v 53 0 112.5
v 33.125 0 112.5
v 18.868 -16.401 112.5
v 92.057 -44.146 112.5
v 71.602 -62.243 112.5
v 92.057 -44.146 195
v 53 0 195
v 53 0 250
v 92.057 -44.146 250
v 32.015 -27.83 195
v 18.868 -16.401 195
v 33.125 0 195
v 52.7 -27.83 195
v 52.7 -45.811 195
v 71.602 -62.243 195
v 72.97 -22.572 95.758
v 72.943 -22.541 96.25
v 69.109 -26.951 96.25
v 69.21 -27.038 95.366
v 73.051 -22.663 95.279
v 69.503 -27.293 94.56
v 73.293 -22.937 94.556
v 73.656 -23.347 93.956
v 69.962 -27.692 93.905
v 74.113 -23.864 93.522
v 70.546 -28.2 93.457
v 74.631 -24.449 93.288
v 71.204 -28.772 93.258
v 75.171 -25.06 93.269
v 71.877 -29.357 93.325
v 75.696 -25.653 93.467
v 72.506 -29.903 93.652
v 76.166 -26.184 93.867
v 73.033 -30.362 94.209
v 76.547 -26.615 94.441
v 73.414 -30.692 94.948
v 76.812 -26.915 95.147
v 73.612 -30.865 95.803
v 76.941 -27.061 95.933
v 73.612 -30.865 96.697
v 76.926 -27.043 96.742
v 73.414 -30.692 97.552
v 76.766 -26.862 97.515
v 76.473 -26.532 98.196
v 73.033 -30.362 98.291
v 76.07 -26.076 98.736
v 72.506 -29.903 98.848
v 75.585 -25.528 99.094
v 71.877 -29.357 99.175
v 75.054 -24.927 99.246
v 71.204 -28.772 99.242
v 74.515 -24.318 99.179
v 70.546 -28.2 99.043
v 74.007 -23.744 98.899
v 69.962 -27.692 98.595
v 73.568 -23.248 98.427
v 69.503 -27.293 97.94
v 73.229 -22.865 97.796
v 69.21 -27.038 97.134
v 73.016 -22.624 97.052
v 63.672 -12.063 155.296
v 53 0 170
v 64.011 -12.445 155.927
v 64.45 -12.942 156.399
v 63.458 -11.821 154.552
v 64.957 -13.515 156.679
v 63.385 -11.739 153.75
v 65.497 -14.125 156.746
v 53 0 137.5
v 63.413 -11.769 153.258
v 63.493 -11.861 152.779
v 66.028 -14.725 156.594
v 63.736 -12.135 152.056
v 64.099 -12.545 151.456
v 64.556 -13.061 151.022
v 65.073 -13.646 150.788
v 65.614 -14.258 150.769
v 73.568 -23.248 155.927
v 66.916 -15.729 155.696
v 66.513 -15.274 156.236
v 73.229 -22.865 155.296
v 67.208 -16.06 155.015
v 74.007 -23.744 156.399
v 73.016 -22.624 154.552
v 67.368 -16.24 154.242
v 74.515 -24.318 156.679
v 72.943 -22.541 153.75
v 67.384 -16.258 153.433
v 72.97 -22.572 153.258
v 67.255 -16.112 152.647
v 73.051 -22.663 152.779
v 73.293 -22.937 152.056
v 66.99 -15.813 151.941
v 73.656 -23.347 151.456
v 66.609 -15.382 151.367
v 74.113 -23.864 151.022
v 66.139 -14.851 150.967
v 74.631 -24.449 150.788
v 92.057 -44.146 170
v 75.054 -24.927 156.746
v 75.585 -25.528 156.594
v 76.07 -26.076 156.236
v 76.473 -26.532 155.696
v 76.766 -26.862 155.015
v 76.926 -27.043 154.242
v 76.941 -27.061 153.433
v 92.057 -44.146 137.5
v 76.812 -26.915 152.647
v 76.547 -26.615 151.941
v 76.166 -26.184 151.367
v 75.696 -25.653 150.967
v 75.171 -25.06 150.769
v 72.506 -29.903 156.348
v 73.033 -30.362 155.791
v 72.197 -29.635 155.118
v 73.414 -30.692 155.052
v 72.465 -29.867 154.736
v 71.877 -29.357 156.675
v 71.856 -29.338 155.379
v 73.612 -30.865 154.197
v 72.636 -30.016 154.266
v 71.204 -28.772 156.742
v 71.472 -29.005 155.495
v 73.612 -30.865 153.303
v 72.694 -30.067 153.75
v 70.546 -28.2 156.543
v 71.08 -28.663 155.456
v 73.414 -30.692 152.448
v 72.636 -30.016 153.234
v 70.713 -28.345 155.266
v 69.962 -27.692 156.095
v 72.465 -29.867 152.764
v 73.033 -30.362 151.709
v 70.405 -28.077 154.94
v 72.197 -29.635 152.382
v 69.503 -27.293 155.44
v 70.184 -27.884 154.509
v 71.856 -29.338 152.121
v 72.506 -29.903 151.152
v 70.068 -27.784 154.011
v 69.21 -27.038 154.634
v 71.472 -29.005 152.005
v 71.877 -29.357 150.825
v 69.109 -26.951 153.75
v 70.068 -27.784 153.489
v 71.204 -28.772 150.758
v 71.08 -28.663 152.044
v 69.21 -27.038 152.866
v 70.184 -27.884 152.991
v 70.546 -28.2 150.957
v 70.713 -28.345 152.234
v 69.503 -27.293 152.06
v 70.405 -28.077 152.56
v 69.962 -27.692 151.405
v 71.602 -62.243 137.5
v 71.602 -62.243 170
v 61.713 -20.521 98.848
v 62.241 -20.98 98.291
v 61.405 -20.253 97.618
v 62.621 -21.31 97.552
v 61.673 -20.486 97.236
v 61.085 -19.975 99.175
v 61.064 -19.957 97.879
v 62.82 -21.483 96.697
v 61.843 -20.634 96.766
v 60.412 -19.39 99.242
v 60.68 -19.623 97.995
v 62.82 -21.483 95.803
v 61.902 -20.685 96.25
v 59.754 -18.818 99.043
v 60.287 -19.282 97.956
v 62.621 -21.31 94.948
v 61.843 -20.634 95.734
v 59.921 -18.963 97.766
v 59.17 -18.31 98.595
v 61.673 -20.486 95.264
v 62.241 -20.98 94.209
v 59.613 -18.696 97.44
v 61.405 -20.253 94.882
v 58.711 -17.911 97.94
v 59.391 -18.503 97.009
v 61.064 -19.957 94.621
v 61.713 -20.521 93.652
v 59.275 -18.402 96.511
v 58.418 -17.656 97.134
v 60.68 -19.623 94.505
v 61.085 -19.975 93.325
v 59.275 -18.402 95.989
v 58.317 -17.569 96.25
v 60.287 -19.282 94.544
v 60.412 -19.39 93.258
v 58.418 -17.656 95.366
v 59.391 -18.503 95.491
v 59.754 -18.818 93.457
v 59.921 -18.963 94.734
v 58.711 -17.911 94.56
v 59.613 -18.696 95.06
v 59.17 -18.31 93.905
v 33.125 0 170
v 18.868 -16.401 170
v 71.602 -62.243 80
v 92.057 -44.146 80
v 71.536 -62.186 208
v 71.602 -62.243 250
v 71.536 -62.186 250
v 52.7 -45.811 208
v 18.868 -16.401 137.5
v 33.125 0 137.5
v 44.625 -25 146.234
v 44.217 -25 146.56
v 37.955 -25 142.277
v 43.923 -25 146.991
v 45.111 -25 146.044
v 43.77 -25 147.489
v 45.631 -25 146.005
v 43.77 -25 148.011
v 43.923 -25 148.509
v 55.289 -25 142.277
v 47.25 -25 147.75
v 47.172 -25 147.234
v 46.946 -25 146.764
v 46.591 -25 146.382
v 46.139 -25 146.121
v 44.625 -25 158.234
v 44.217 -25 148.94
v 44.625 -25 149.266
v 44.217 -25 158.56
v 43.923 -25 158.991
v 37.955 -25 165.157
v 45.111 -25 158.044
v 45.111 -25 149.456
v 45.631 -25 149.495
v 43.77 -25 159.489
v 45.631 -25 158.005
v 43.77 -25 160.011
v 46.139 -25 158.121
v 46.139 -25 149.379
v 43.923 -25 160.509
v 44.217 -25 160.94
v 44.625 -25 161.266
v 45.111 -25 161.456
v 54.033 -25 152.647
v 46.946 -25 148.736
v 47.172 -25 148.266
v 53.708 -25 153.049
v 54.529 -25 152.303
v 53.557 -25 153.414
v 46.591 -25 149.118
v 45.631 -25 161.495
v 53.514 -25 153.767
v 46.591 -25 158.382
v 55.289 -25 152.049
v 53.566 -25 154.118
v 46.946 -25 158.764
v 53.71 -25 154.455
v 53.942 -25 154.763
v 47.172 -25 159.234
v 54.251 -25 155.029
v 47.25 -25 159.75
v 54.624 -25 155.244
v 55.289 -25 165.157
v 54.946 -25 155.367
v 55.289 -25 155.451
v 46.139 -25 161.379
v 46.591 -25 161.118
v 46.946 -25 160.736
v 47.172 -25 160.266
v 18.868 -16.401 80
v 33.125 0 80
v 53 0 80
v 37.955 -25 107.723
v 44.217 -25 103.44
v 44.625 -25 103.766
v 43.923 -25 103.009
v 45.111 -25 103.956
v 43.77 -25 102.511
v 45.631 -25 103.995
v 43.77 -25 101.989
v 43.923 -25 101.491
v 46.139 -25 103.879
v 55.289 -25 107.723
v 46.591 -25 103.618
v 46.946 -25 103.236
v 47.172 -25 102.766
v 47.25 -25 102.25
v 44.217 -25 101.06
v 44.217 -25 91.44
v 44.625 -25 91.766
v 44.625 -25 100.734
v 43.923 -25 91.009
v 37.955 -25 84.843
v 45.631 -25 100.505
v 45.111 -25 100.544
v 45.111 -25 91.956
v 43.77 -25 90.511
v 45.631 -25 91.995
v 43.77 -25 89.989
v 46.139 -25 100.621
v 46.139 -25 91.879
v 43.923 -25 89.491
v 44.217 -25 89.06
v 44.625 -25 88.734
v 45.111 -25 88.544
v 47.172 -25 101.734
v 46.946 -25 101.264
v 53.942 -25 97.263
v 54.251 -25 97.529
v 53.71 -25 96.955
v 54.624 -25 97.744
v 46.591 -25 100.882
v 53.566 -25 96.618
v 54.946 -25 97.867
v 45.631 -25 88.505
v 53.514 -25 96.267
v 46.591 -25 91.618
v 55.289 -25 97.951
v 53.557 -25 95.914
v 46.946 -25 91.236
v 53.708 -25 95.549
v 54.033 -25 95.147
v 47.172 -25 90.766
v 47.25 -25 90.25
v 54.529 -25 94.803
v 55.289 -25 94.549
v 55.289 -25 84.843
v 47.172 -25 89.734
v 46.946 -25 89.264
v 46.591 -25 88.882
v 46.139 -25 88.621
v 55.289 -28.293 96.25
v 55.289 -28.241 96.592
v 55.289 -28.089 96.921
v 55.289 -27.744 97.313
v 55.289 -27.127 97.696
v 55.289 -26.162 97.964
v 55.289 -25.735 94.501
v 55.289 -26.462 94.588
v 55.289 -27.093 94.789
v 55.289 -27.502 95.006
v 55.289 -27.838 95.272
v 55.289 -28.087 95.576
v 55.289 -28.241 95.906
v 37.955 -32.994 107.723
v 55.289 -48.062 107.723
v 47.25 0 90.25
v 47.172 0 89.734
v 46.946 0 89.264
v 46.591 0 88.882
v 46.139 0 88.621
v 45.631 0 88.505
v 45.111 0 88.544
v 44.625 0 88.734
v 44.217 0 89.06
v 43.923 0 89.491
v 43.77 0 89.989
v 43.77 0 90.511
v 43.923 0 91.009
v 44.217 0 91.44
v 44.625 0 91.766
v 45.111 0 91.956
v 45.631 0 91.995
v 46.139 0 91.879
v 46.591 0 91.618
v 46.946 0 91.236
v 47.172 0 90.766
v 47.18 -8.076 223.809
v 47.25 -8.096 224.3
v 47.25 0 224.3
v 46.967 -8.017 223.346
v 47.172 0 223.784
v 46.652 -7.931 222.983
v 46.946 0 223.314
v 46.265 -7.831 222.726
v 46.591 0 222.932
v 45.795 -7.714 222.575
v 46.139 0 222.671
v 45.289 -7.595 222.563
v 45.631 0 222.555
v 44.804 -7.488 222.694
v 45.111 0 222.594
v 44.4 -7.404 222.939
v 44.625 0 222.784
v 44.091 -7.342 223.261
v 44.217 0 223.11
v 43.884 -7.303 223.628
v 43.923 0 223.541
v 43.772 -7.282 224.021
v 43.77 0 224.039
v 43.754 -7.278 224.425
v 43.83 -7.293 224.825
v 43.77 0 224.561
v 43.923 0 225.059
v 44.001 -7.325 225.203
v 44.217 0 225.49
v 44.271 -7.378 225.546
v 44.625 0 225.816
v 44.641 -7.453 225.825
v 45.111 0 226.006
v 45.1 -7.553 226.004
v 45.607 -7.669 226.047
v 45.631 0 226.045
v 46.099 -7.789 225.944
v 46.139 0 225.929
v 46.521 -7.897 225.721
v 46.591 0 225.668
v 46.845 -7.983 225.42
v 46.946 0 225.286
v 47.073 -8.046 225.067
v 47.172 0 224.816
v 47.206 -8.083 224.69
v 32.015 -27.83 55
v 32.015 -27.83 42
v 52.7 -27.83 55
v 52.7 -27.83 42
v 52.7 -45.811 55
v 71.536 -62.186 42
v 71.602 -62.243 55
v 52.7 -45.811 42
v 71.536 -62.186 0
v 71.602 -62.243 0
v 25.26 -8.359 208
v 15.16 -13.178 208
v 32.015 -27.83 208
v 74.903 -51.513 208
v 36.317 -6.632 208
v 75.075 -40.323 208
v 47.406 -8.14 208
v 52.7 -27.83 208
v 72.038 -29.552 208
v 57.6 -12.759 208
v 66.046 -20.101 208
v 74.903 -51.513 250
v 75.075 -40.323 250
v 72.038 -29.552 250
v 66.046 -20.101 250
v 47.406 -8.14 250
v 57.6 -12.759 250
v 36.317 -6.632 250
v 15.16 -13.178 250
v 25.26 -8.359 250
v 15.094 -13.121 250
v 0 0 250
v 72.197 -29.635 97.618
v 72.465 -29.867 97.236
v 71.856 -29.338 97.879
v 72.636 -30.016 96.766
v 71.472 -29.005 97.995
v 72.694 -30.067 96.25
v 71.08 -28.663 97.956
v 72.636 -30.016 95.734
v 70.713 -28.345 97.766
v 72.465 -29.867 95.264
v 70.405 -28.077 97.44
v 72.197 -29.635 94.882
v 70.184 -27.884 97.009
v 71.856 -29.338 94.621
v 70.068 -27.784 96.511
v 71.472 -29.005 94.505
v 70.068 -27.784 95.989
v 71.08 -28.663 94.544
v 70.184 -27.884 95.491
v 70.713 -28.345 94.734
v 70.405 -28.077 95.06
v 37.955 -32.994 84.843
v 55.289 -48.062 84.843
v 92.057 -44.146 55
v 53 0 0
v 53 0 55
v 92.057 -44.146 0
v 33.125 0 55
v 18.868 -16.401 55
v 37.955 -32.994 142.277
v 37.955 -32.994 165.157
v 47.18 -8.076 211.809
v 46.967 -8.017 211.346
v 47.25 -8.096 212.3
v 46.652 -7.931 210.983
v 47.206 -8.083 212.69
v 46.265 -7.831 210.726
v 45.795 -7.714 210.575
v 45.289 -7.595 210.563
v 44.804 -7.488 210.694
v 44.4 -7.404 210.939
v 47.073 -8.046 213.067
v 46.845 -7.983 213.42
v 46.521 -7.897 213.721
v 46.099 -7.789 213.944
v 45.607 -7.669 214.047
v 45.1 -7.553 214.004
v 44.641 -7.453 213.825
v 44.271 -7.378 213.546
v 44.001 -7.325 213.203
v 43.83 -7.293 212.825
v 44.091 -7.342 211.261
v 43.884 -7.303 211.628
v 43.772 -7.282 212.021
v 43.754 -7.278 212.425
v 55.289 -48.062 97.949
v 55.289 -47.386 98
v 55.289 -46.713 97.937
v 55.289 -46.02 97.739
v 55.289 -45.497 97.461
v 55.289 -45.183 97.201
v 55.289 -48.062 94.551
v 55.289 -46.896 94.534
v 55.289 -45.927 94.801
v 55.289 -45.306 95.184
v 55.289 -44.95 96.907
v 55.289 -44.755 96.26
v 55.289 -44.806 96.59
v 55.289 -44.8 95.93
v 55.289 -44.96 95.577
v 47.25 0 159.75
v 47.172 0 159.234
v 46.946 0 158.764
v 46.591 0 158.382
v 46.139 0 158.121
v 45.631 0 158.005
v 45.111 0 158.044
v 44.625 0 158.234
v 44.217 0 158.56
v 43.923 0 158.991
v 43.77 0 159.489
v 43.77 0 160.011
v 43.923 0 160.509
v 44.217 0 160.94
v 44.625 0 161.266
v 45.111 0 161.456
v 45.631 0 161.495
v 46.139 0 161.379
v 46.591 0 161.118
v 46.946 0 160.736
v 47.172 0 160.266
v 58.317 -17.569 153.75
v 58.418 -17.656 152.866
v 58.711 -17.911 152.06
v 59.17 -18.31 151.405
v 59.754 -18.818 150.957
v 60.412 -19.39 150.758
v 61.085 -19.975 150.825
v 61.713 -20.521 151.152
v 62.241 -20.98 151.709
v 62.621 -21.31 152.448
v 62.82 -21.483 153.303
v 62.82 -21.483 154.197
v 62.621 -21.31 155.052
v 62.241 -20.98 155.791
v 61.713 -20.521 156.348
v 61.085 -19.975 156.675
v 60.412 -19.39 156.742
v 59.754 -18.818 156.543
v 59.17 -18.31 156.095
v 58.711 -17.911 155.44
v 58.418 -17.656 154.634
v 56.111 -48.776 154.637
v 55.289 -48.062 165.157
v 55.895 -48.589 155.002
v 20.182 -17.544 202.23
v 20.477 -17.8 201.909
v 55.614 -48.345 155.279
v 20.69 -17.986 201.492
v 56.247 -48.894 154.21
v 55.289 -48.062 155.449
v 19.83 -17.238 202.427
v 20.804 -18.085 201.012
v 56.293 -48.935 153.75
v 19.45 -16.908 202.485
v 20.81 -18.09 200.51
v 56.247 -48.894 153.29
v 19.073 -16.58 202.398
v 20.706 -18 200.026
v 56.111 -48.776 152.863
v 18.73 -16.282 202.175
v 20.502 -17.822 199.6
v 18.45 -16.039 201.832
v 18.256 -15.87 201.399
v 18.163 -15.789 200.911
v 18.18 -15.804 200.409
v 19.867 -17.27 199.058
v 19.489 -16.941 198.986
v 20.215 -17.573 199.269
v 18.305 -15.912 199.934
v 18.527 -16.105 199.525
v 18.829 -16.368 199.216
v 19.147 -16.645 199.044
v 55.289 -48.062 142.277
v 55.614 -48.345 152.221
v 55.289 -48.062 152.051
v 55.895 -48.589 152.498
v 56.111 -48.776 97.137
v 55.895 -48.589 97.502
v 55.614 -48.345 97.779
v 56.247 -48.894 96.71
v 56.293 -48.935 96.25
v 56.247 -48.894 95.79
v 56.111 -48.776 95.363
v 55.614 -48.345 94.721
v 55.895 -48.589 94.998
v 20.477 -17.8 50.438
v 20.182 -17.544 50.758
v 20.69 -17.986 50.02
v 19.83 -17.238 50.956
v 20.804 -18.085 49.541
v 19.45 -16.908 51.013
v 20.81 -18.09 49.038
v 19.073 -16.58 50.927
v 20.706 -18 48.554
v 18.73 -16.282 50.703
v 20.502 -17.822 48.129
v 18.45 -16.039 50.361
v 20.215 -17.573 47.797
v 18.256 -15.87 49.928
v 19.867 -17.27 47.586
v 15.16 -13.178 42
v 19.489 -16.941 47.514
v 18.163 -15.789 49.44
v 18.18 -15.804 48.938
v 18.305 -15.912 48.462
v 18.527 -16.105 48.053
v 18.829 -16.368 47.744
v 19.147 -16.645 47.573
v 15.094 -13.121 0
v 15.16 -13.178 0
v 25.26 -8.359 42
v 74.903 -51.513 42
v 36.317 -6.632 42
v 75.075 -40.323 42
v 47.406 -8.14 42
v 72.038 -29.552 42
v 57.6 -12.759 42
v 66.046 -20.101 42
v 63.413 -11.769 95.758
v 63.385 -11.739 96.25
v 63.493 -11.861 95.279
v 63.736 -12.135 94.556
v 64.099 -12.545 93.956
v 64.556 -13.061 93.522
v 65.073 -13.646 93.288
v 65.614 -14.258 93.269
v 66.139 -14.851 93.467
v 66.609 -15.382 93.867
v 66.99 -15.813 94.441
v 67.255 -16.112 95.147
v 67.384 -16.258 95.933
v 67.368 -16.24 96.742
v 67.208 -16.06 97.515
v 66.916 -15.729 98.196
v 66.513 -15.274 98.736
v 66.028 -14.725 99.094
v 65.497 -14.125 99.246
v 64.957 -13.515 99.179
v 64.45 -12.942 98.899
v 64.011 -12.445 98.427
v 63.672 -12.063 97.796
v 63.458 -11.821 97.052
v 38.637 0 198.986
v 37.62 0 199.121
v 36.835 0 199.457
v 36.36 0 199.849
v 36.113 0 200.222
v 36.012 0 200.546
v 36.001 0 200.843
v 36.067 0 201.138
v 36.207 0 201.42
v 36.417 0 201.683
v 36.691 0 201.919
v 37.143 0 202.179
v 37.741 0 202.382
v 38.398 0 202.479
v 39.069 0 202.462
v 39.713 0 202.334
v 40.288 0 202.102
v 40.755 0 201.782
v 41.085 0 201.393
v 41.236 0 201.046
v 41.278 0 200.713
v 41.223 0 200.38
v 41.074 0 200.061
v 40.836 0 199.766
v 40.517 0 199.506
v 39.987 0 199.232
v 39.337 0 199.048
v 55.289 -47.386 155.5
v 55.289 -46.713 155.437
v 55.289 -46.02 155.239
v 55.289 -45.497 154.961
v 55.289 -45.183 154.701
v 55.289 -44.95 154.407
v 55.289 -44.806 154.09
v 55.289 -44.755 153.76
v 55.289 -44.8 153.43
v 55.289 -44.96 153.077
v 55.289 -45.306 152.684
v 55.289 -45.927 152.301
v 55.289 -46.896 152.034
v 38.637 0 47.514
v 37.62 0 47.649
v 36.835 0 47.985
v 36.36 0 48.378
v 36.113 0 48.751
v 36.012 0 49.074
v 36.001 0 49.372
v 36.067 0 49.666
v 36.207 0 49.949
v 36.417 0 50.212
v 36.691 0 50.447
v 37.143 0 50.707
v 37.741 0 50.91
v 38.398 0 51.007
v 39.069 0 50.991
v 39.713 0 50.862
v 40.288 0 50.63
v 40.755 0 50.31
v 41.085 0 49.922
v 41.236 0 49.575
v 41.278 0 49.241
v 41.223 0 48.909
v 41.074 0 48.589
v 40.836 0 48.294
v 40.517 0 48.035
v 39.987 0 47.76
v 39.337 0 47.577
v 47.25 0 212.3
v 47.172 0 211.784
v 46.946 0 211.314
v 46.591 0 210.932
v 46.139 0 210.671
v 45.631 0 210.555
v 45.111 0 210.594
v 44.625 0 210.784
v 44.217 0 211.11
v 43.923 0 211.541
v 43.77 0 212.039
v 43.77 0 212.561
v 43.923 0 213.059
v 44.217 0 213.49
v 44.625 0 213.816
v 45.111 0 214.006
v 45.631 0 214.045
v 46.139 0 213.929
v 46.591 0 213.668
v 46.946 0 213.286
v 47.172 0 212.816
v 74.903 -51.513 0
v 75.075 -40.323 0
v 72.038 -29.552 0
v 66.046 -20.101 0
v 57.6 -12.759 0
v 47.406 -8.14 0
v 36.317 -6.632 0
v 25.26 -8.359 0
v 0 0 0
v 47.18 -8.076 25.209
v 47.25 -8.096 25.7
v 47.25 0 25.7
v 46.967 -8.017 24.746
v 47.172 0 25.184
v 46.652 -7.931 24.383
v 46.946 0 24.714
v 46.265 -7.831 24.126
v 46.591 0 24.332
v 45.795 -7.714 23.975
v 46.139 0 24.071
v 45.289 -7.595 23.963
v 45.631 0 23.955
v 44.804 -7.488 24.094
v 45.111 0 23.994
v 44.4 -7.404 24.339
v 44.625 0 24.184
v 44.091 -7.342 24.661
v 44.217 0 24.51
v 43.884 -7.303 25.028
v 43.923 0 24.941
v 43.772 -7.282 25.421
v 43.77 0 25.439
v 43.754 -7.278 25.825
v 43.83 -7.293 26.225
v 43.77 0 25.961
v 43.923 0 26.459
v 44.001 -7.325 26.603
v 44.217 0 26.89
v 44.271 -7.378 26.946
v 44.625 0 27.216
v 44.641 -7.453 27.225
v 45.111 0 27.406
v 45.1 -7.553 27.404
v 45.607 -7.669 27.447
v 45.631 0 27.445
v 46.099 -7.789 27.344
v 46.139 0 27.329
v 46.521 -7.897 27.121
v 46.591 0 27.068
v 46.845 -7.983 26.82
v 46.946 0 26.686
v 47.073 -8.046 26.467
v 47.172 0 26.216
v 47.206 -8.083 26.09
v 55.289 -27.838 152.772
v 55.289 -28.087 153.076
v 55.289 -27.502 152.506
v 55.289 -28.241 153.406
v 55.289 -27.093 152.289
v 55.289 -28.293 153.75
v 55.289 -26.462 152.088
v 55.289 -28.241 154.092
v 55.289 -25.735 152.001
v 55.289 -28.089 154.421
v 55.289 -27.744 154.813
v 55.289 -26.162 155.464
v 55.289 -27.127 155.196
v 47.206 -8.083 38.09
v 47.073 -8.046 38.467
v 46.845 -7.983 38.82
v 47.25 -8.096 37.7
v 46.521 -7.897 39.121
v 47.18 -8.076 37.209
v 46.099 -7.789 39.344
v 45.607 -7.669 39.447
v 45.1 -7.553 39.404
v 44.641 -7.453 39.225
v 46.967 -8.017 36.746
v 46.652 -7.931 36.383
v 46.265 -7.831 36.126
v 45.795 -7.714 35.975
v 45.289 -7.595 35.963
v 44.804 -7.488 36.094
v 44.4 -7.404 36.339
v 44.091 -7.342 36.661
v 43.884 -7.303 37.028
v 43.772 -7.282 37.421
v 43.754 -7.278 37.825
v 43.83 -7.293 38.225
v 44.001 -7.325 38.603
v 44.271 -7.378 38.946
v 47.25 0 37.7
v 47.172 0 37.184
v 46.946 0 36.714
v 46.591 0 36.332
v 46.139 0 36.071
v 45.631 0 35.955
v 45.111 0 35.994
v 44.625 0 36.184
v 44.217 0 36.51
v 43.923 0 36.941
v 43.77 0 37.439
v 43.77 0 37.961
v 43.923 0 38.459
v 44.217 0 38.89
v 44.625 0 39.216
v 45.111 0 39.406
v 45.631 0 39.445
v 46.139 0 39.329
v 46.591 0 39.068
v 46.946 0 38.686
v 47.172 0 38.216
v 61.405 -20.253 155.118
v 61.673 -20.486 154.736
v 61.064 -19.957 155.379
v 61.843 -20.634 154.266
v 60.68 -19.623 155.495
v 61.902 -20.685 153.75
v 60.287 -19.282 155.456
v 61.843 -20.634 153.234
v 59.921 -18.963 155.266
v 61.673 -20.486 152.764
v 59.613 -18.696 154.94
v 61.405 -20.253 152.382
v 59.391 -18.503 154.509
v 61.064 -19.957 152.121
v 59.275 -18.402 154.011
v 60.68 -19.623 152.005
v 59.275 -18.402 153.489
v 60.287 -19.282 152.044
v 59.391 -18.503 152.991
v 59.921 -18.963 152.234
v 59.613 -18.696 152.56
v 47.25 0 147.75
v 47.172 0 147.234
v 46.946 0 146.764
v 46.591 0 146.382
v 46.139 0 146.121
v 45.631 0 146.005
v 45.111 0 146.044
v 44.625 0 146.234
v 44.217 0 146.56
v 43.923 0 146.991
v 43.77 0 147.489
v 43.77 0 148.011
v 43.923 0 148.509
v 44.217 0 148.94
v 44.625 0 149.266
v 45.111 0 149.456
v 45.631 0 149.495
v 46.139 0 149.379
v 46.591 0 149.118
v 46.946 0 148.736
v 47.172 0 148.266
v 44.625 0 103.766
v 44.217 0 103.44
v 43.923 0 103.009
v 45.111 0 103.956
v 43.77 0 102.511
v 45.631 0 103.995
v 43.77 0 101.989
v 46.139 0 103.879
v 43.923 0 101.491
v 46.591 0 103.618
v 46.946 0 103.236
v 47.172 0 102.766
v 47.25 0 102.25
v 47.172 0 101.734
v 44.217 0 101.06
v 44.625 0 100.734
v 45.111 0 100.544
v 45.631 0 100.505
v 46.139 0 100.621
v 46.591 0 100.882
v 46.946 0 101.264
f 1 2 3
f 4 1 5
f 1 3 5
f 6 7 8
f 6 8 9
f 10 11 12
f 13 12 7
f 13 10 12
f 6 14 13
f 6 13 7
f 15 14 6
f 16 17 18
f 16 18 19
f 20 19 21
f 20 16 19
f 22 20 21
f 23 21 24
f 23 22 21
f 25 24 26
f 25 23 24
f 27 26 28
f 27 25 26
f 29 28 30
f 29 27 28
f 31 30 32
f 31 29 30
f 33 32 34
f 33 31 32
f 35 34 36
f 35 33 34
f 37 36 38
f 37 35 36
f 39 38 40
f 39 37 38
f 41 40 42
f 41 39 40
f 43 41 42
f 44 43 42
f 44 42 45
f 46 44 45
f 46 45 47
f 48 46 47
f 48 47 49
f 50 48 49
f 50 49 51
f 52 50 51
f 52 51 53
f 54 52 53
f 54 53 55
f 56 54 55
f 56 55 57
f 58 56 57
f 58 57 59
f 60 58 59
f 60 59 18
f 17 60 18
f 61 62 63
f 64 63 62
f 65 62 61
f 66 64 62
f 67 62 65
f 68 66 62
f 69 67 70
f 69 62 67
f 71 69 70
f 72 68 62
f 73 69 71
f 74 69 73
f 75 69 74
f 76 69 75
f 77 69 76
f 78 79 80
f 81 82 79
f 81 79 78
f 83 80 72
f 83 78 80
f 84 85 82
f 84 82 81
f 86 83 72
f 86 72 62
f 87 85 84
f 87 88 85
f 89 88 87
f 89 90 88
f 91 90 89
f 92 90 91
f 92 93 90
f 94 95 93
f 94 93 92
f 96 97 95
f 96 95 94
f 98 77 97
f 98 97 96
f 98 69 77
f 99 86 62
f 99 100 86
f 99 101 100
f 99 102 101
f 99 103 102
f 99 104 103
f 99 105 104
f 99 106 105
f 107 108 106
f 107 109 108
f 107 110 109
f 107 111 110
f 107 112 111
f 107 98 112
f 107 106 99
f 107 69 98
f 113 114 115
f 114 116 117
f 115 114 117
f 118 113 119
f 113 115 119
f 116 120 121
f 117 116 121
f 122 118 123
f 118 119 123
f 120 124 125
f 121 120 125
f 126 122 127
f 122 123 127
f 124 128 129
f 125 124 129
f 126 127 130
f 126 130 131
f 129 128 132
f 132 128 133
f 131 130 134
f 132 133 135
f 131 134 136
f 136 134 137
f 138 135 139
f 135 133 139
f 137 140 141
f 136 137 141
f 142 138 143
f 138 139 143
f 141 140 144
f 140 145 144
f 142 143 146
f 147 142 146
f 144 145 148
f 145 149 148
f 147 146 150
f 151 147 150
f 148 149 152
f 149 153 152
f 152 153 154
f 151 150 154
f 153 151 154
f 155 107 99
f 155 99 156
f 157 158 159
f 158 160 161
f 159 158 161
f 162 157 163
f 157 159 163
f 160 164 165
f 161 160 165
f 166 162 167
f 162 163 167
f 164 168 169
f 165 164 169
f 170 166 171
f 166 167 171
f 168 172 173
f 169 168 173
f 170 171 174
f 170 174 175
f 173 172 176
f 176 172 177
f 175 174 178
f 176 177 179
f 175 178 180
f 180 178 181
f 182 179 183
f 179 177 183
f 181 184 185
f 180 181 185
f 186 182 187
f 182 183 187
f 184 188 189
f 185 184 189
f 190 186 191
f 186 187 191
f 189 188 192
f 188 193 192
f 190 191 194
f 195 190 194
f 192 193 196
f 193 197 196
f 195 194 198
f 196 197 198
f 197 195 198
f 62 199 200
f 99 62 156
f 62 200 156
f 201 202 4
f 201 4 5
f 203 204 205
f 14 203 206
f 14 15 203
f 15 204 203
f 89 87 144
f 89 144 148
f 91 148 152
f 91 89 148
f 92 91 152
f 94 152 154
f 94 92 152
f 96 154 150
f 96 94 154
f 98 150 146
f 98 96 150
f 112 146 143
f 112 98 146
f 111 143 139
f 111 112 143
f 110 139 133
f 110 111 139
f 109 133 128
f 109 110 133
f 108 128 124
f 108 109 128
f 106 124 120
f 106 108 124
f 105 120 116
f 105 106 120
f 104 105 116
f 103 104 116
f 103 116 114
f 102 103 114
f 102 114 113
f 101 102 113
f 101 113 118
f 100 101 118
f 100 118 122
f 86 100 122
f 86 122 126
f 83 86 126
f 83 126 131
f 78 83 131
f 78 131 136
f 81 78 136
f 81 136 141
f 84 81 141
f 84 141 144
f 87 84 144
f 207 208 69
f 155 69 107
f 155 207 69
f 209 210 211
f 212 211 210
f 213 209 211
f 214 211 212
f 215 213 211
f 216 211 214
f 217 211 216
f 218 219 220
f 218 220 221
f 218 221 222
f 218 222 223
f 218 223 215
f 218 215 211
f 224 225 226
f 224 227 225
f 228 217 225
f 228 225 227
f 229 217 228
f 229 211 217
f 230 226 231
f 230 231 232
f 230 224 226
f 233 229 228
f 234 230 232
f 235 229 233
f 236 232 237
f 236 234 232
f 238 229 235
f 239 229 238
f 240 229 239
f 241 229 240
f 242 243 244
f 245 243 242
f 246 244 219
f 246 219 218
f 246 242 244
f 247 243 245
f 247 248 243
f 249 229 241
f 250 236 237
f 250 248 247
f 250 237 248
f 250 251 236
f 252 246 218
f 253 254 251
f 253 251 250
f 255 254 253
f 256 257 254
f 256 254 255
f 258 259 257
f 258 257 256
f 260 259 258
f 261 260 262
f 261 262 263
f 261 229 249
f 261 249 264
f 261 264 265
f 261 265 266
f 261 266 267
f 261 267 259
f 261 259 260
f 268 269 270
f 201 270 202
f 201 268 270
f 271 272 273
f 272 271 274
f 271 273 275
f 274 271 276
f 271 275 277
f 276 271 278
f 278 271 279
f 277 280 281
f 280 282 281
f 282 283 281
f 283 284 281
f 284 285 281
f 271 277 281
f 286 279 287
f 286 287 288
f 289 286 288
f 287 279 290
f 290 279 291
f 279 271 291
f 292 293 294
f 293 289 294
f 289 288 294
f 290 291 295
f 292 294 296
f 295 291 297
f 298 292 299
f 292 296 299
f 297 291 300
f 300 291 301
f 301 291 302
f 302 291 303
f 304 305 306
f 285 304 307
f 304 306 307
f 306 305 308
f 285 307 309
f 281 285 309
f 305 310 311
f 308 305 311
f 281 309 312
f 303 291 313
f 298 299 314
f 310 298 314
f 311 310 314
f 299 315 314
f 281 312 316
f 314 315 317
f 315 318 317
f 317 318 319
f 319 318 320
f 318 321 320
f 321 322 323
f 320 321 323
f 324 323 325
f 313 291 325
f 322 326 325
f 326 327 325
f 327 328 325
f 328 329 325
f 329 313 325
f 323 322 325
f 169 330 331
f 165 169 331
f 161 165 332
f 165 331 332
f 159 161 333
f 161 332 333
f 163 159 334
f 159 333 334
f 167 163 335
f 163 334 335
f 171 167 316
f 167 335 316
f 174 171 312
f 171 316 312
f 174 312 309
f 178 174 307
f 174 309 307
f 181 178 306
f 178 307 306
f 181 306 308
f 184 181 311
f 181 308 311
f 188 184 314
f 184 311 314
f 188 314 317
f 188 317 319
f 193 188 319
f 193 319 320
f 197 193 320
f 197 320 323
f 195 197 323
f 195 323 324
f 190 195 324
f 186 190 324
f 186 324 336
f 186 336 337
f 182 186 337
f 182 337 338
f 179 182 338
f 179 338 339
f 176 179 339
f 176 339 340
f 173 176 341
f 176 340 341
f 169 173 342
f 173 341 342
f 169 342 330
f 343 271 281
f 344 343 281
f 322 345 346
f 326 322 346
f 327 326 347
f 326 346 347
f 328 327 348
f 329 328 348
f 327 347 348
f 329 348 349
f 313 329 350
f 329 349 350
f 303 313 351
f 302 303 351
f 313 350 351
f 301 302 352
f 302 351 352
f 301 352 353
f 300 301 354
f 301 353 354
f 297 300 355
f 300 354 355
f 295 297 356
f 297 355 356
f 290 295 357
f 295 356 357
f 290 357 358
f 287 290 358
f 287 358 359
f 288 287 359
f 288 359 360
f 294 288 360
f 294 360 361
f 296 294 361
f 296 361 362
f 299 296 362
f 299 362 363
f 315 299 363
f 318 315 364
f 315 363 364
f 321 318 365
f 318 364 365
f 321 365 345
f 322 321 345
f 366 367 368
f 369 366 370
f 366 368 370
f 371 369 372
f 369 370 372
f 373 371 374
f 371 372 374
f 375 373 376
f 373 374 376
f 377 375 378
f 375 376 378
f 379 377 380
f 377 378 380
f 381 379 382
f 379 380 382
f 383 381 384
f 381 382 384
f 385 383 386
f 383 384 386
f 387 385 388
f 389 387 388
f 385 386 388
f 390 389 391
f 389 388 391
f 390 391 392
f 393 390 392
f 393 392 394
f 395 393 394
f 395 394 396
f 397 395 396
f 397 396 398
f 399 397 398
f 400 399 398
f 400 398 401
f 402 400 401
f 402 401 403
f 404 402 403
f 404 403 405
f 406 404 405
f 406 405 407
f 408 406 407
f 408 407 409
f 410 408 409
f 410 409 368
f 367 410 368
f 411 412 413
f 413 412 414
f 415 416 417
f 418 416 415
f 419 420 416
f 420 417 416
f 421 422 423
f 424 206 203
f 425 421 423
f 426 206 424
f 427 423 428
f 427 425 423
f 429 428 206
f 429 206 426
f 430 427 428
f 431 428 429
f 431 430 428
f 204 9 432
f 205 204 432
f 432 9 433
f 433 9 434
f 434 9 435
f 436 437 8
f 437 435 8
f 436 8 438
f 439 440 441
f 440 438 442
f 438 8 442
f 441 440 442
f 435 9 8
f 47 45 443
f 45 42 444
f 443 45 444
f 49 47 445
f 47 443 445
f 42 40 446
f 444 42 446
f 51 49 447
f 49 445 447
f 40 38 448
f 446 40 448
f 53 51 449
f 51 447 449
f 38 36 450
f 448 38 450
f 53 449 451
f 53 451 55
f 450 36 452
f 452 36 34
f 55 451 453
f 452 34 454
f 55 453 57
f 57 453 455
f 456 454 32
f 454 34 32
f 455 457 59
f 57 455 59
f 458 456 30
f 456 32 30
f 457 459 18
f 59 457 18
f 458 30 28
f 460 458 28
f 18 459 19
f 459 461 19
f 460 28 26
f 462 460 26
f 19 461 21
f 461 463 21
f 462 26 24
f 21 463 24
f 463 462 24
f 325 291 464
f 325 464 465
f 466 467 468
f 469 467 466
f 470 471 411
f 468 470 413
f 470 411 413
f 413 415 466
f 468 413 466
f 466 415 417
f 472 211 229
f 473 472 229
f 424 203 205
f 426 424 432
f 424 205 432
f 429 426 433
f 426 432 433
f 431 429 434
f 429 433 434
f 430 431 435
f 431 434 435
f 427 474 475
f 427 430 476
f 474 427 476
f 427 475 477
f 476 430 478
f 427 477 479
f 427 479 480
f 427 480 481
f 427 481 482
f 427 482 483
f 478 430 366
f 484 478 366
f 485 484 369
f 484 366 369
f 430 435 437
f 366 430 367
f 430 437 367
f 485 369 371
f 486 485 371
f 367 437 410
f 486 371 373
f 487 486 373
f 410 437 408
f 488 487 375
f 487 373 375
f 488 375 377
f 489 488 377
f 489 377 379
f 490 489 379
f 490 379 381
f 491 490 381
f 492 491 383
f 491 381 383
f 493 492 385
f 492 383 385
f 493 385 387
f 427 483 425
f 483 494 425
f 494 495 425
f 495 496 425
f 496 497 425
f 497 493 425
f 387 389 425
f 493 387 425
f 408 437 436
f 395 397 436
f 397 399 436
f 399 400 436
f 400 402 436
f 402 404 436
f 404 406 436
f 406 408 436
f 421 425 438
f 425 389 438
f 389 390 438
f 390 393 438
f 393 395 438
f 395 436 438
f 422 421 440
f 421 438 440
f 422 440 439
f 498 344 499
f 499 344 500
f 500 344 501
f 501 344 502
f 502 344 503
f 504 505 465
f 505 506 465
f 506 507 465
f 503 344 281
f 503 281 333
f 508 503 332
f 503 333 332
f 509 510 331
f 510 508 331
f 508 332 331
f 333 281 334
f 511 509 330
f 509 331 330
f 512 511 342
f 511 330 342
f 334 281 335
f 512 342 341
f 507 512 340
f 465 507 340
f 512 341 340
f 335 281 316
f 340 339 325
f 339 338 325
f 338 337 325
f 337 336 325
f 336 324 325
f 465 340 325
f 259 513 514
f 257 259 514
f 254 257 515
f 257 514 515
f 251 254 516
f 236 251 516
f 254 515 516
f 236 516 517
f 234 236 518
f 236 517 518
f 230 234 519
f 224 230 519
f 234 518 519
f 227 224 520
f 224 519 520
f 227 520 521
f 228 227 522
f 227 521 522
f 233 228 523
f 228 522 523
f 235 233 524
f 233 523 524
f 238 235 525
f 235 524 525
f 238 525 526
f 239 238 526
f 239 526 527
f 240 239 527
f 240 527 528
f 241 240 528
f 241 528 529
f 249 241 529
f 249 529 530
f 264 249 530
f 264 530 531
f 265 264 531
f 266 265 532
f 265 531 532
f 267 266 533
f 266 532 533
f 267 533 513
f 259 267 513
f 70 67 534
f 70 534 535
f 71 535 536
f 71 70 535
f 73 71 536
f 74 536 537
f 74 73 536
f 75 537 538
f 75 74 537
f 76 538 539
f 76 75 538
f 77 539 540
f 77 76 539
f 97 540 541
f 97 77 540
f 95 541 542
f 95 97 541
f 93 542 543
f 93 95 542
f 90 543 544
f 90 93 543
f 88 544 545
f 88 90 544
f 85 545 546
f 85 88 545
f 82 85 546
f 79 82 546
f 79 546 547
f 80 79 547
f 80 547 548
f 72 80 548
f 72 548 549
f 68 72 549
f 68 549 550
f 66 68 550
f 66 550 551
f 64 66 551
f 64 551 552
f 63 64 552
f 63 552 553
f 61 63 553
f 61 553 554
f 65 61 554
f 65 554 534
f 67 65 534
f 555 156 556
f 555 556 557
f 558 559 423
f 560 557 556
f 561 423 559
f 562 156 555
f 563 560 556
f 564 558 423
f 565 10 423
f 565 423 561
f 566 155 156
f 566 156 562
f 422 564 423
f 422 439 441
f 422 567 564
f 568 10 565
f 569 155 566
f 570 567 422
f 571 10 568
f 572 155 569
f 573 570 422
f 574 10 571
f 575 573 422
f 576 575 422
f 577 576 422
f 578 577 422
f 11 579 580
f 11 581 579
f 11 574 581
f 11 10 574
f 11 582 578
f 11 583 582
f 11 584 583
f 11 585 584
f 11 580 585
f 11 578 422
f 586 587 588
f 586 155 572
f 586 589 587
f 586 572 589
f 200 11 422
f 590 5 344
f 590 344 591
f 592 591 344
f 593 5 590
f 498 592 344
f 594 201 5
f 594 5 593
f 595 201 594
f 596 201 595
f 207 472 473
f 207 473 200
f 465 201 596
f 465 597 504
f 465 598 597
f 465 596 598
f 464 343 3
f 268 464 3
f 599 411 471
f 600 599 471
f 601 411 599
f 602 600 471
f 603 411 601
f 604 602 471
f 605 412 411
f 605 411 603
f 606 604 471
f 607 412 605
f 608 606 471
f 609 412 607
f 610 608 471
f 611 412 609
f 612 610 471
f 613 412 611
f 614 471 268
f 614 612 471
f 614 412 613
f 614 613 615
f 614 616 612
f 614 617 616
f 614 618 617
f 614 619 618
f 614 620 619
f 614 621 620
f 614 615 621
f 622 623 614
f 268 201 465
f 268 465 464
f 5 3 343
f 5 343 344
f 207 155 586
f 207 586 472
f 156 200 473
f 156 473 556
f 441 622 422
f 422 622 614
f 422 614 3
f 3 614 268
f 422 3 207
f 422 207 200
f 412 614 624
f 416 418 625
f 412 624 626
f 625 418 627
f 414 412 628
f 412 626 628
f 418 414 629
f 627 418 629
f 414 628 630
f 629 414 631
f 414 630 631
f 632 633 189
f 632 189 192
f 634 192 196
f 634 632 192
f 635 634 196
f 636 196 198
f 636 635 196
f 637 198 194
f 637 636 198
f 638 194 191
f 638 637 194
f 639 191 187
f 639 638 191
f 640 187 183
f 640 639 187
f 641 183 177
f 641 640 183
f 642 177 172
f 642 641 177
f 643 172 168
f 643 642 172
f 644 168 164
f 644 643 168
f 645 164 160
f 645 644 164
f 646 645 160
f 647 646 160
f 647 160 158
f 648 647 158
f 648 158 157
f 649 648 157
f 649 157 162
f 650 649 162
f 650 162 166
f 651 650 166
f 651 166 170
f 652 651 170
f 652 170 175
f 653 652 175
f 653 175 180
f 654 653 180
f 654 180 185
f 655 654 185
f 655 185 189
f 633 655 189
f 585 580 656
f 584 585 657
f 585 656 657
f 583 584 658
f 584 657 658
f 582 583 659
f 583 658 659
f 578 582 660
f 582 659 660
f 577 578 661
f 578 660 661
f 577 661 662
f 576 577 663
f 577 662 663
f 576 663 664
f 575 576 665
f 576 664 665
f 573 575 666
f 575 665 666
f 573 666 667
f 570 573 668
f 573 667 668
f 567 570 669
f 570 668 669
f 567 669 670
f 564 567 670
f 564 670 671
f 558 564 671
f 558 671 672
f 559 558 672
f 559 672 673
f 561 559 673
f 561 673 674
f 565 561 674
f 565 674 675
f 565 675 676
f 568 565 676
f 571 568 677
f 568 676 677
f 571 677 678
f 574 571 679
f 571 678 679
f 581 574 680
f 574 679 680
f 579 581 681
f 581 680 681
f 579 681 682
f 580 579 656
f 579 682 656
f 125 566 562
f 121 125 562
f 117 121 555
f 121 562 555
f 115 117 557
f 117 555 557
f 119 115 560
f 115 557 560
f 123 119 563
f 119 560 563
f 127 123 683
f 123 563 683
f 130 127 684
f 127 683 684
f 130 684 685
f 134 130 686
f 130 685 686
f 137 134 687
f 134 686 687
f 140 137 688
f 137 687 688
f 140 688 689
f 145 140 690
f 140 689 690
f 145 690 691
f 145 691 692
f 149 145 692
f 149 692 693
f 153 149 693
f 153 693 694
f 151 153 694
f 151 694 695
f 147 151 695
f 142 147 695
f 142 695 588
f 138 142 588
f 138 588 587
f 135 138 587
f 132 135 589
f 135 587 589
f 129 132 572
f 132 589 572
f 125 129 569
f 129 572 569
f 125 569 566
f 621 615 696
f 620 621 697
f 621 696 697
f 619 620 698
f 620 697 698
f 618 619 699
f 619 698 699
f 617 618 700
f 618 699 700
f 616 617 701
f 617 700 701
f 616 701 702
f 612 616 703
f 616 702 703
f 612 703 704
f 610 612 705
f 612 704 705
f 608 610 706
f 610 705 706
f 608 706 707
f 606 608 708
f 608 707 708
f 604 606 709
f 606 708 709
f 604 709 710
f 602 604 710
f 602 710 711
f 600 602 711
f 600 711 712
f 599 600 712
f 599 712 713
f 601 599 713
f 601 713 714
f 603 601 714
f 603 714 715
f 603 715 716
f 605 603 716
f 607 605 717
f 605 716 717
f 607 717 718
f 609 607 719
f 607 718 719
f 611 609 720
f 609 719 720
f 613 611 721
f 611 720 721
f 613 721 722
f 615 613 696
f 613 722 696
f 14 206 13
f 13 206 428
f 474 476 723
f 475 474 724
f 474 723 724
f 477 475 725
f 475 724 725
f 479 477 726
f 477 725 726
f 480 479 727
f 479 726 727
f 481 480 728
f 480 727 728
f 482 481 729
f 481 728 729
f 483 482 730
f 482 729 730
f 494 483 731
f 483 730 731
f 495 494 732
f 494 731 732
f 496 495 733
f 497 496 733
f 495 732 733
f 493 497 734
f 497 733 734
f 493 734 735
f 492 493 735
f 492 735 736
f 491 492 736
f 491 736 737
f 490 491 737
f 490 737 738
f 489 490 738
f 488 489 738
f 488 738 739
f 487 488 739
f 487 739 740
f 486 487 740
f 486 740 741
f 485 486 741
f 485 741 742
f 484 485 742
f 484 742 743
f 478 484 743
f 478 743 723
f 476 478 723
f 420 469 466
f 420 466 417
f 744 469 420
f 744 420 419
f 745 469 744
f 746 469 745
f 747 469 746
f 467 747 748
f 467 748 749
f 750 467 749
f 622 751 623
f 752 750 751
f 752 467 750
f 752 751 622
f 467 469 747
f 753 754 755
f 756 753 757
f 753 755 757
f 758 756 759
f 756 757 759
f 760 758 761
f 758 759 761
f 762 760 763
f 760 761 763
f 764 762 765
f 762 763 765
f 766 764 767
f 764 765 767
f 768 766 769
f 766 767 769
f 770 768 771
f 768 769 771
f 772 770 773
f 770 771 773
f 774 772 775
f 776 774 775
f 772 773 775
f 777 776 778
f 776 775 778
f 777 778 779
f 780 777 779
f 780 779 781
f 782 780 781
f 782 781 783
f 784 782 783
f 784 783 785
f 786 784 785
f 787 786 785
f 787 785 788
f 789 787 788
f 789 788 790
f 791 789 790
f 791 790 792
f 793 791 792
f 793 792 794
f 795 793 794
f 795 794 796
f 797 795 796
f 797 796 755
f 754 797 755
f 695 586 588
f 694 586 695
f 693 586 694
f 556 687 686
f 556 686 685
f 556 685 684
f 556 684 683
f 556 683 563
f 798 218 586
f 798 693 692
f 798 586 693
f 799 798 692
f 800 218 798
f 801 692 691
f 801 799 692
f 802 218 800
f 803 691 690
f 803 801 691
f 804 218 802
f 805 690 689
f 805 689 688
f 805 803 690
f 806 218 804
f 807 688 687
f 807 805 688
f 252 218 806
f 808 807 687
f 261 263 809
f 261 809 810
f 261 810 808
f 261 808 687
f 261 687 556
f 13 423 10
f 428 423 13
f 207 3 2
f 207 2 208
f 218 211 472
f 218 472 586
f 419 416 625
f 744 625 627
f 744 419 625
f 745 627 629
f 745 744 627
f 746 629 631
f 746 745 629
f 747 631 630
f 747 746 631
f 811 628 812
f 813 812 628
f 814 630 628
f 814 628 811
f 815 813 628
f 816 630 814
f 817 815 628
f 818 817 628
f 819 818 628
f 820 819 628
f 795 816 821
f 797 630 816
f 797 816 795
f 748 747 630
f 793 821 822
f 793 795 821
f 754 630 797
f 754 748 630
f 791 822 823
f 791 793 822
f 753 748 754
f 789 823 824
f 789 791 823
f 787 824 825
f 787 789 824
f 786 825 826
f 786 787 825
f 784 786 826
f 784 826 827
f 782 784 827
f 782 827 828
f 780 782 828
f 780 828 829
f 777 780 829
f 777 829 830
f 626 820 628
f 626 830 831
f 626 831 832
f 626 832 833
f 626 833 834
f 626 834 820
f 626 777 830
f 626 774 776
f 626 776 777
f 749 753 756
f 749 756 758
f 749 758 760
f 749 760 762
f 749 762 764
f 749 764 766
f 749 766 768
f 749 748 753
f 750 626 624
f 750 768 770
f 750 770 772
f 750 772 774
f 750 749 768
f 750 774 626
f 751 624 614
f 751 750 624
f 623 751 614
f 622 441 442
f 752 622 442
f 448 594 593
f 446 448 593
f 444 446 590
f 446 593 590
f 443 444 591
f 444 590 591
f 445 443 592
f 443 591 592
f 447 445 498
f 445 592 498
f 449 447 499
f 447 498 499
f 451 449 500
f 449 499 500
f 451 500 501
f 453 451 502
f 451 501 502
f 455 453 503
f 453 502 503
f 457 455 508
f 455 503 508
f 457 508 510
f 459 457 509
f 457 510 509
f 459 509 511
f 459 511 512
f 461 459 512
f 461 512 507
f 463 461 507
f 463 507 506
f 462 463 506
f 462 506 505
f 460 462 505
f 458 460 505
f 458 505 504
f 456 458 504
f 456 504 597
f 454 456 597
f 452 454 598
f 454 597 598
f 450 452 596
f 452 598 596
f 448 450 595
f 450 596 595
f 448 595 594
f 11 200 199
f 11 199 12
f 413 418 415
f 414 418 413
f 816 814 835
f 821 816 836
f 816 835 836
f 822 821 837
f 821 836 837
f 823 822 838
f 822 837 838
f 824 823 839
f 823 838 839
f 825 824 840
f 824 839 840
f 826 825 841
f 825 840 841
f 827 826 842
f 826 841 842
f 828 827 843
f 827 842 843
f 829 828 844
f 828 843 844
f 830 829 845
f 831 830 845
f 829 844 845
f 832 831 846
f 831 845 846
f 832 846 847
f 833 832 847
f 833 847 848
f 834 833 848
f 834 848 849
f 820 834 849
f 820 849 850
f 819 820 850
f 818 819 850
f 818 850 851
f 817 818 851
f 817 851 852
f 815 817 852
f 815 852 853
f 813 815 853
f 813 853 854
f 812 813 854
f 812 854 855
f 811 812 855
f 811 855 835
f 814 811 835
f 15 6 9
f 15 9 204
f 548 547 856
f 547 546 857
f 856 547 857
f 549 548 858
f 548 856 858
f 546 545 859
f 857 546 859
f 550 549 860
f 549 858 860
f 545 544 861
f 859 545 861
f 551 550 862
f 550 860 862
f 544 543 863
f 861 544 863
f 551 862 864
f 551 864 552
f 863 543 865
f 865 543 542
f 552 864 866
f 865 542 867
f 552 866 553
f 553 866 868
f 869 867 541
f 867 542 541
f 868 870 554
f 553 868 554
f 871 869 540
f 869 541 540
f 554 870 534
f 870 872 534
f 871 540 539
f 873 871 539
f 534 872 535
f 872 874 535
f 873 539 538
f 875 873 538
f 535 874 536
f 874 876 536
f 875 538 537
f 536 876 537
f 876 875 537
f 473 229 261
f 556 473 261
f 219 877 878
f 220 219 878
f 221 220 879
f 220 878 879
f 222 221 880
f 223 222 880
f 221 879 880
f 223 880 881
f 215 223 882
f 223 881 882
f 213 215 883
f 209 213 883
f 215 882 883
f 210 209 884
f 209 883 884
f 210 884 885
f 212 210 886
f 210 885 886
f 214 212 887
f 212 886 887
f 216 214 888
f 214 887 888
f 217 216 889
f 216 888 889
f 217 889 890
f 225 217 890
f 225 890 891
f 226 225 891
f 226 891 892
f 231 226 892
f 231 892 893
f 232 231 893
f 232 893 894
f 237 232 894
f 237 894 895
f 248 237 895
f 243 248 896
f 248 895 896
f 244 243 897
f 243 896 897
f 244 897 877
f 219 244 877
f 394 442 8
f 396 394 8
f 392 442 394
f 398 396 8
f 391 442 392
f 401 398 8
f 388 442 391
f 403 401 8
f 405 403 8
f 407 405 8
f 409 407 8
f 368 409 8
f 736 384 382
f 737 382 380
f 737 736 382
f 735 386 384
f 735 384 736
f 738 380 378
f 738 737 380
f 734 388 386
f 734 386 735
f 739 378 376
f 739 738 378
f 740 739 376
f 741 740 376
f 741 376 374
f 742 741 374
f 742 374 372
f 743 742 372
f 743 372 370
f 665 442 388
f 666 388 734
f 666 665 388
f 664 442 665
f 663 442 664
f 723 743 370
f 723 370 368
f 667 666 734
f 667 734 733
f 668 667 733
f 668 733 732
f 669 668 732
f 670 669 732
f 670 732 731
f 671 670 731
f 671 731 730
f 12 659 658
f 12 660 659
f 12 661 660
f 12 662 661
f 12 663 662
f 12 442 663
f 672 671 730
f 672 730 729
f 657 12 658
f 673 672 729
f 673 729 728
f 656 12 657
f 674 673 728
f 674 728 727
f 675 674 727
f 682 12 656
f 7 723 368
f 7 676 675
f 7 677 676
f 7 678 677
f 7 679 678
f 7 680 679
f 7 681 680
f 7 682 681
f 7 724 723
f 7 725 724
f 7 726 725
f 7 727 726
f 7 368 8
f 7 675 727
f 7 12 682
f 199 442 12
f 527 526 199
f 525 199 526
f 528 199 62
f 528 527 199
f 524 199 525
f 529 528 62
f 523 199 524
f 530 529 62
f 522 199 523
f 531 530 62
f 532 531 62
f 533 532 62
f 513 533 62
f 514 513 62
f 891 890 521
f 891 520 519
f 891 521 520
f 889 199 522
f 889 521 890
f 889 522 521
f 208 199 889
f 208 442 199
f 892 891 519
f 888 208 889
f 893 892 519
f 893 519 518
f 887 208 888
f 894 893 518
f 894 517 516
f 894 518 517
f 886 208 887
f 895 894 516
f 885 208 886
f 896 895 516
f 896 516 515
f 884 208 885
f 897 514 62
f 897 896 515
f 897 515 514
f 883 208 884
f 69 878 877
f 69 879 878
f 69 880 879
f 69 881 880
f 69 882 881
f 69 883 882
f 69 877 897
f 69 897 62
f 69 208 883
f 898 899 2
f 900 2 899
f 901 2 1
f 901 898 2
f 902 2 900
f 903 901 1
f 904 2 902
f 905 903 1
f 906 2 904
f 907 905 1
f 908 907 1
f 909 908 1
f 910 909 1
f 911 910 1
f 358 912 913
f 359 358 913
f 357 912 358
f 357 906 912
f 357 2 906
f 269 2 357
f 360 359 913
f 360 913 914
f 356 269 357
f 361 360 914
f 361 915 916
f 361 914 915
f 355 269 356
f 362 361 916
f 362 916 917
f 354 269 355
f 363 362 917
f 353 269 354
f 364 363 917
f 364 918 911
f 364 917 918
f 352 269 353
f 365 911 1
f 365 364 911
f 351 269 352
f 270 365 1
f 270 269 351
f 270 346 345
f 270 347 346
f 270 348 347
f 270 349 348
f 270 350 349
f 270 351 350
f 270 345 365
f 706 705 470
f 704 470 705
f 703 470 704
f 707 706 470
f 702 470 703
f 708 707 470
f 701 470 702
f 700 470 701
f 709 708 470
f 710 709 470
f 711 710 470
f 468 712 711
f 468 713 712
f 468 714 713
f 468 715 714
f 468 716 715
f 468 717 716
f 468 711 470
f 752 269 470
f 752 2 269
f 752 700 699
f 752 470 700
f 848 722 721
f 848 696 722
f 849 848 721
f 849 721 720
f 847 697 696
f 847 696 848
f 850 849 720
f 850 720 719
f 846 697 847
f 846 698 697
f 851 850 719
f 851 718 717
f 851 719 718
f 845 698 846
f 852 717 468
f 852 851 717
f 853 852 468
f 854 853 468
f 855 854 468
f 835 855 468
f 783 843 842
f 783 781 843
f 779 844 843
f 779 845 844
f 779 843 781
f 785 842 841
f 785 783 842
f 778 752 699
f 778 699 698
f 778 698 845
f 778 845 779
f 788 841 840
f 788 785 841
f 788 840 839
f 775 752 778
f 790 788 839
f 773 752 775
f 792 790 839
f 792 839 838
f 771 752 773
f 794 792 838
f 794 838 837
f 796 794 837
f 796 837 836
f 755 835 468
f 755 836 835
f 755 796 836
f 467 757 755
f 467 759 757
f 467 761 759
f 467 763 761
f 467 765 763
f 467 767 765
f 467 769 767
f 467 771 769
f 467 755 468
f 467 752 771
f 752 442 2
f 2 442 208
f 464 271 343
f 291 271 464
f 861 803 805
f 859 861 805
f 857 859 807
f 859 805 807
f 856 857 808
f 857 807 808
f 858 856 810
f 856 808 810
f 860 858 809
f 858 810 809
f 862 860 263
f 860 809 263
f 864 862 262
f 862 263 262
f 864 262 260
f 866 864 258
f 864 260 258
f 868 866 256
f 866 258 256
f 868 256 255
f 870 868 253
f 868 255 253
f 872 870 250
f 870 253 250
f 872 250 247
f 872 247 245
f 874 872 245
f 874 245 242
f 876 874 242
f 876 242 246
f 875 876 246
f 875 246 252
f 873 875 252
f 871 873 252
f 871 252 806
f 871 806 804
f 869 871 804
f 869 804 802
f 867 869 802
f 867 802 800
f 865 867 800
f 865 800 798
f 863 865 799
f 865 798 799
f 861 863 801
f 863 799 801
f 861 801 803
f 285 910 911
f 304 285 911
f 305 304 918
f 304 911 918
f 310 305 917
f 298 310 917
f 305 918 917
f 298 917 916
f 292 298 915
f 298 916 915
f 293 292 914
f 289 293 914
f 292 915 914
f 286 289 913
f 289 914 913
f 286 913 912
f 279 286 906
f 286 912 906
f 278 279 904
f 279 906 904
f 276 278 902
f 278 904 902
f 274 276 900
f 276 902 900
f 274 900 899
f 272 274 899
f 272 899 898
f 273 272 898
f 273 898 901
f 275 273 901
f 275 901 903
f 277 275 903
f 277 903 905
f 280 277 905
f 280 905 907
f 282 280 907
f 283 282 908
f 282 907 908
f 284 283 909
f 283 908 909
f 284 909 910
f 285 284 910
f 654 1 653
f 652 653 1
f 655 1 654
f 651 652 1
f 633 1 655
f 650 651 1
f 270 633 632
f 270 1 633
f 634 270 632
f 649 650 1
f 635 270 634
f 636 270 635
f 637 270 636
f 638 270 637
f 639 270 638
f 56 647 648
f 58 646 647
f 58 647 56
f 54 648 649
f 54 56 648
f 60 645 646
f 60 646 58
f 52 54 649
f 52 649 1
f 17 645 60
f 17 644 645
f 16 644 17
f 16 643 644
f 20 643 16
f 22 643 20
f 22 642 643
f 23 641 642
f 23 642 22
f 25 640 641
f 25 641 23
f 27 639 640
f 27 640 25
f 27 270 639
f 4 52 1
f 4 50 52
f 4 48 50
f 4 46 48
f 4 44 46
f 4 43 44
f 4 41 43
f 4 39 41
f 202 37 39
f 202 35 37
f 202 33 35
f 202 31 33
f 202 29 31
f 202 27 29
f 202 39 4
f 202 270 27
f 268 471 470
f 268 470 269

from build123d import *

# Parameters (mm, degrees)
EXTRUDE_1_DEPTH      = 250
SKETCH_2_R           = 38.7
CUT_EXTRUDE_1_DEPTH  = 42
SKETCH_3_W           = 28.23457759
SKETCH_3_H           = 26.953334418
CUT_EXTRUDE_2_DEPTH  = 14
SKETCH_4_W           = 170
SKETCH_4_H           = 25
CUT_EXTRUDE_3_DEPTH  = 78
SKETCH_7_R           = 1.75
CUT_EXTRUDE_5_DEPTH  = 25
SKETCH_6_R           = 1.75
CUT_EXTRUDE_6_DEPTH  = 90
SKETCH_5_R           = 1.75
CUT_EXTRUDE_8_DEPTH  = 10
SKETCH_9_R           = 1.75
CUT_EXTRUDE_9_DEPTH  = 124
SKETCH_10_W          = 17.333433977
SKETCH_10_H          = 22.880132851
CUT_EXTRUDE_10_DEPTH = 31
SKETCH_11_R          = 3
CUT_EXTRUDE_11_DEPTH = 10


with BuildPart() as part:
    # 草图1 → 凸台-拉伸1 (new body)
    with BuildSketch(Plane.XY):
        Polygon((0, 0), (53, 0), (92.057126275, -44.146050576), (71.602312757, -62.242940876), (15.094191604, -13.12118058), align=None)
    extrude(amount=EXTRUDE_1_DEPTH)

    # 草图2 → 切除-拉伸1 (cut)
    with BuildSketch(Plane.XY.offset(250)):
        with Locations((36.7, -45.33)):
            Circle(SKETCH_2_R)
    cut_extrude_1 = extrude(amount=-CUT_EXTRUDE_1_DEPTH, mode=Mode.SUBTRACT)

    # 草图3 → 切除-拉伸2 (cut)
    with BuildSketch(Plane.XY.offset(208)):
        with Locations((38.582711205, -41.306667209)):
            Rectangle(SKETCH_3_W, SKETCH_3_H)
    cut_extrude_2 = extrude(amount=-CUT_EXTRUDE_2_DEPTH, mode=Mode.SUBTRACT)

    # 草图4 → 切除-拉伸3 (cut)
    with BuildSketch(Plane(origin=(0, 0, 0), x_dir=(0.75470958, -0.656059029, 0), z_dir=(-0.656059029, -0.75470958, 0))):
        with Locations((110, 67.5)):
            Rectangle(SKETCH_4_W, SKETCH_4_H)
        with Locations((110, 125)):
            Rectangle(SKETCH_4_W, SKETCH_4_H)
        with Locations((110, 182.5)):
            Rectangle(SKETCH_4_W, SKETCH_4_H)
    extrude(amount=-CUT_EXTRUDE_3_DEPTH, mode=Mode.SUBTRACT)

    # 镜向1: 切除-拉伸1, 切除-拉伸2 across plane
    add(cut_extrude_1.mirror(Plane.XY.offset(125)), mode=Mode.SUBTRACT)
    add(cut_extrude_2.mirror(Plane.XY.offset(125)), mode=Mode.SUBTRACT)

    # 草图7 → 切除-拉伸5 (cut)
    with BuildSketch(Plane(origin=(0, 0, 0), x_dir=(1, 0, 0), z_dir=(0, 1, 0))):
        with Locations((45.5, -159.75)):
            Circle(SKETCH_7_R)
        with Locations((45.5, -147.75)):
            Circle(SKETCH_7_R)
        with Locations((45.5, -102.25)):
            Circle(SKETCH_7_R)
        with Locations((45.5, -90.25)):
            Circle(SKETCH_7_R)
    extrude(amount=-CUT_EXTRUDE_5_DEPTH, mode=Mode.SUBTRACT)

    # 草图6 → 切除-拉伸6 (cut)
    with BuildSketch(Plane(origin=(0, 0, 0), x_dir=(0.75470958, -0.656059029, 0), z_dir=(-0.656059029, -0.75470958, 0))):
        with Locations((72.838810202, 96.25)):
            Circle(SKETCH_6_R)
        with Locations((58.538810202, 96.25)):
            Circle(SKETCH_6_R)
        with Locations((72.838810202, 153.75)):
            Circle(SKETCH_6_R)
        with Locations((58.538810202, 153.75)):
            Circle(SKETCH_6_R)
    extrude(amount=-CUT_EXTRUDE_6_DEPTH, mode=Mode.SUBTRACT)

    # 草图5 → 切除-拉伸8 (cut)
    with BuildSketch(Plane(origin=(0, 0, 0), x_dir=(1, 0, 0), z_dir=(0, 1, 0))):
        with Locations((45.5, -212.3)):
            Circle(SKETCH_5_R)
        with Locations((45.5, -224.3)):
            Circle(SKETCH_5_R)
        with Locations((45.5, -25.7)):
            Circle(SKETCH_5_R)
        with Locations((45.5, -37.7)):
            Circle(SKETCH_5_R)
    extrude(amount=-CUT_EXTRUDE_8_DEPTH, mode=Mode.SUBTRACT)

    # 草图9 → 切除-拉伸9 (cut)
    with BuildSketch(Plane(origin=(29.7295376, 26.302473018, 0), x_dir=(0, 0, -1), z_dir=(0.748955721, 0.662620048, 0))):
        with Locations((-49.264197296, -25.601913803)):
            Circle(SKETCH_9_R)
        with Locations((-200.735802704, -25.601913803)):
            Circle(SKETCH_9_R)
    extrude(amount=-CUT_EXTRUDE_9_DEPTH, mode=Mode.SUBTRACT)

    # 草图10 → 切除-拉伸10 (cut)
    with BuildSketch(Plane(origin=(0, -25, 0), x_dir=(1, 0, 0), z_dir=(0, 1, 0))):
        with Locations((46.622123833, -96.2830381)):
            Rectangle(SKETCH_10_W, SKETCH_10_H)
    cut_extrude_10 = extrude(amount=-CUT_EXTRUDE_10_DEPTH, mode=Mode.SUBTRACT)

    # 镜向2: 切除-拉伸10 across plane
    add(cut_extrude_10.mirror(Plane.XY.offset(125)), mode=Mode.SUBTRACT)

    # 草图11 → 切除-拉伸11 (cut)
    with BuildSketch(Plane(origin=(22.962066015, 26.414835308, 0), x_dir=(-0.75470958, 0.656059029, 0), z_dir=(-0.656059029, -0.75470958, 0))):
        with Locations((-58.538810202, -96.25)):
            Circle(SKETCH_11_R)
        with Locations((-72.838810202, -96.25)):
            Circle(SKETCH_11_R)
        with Locations((-58.538810202, -153.75)):
            Circle(SKETCH_11_R)
        with Locations((-72.838810202, -153.75)):
            Circle(SKETCH_11_R)
    extrude(amount=CUT_EXTRUDE_11_DEPTH, mode=Mode.SUBTRACT)


solid = part.part
